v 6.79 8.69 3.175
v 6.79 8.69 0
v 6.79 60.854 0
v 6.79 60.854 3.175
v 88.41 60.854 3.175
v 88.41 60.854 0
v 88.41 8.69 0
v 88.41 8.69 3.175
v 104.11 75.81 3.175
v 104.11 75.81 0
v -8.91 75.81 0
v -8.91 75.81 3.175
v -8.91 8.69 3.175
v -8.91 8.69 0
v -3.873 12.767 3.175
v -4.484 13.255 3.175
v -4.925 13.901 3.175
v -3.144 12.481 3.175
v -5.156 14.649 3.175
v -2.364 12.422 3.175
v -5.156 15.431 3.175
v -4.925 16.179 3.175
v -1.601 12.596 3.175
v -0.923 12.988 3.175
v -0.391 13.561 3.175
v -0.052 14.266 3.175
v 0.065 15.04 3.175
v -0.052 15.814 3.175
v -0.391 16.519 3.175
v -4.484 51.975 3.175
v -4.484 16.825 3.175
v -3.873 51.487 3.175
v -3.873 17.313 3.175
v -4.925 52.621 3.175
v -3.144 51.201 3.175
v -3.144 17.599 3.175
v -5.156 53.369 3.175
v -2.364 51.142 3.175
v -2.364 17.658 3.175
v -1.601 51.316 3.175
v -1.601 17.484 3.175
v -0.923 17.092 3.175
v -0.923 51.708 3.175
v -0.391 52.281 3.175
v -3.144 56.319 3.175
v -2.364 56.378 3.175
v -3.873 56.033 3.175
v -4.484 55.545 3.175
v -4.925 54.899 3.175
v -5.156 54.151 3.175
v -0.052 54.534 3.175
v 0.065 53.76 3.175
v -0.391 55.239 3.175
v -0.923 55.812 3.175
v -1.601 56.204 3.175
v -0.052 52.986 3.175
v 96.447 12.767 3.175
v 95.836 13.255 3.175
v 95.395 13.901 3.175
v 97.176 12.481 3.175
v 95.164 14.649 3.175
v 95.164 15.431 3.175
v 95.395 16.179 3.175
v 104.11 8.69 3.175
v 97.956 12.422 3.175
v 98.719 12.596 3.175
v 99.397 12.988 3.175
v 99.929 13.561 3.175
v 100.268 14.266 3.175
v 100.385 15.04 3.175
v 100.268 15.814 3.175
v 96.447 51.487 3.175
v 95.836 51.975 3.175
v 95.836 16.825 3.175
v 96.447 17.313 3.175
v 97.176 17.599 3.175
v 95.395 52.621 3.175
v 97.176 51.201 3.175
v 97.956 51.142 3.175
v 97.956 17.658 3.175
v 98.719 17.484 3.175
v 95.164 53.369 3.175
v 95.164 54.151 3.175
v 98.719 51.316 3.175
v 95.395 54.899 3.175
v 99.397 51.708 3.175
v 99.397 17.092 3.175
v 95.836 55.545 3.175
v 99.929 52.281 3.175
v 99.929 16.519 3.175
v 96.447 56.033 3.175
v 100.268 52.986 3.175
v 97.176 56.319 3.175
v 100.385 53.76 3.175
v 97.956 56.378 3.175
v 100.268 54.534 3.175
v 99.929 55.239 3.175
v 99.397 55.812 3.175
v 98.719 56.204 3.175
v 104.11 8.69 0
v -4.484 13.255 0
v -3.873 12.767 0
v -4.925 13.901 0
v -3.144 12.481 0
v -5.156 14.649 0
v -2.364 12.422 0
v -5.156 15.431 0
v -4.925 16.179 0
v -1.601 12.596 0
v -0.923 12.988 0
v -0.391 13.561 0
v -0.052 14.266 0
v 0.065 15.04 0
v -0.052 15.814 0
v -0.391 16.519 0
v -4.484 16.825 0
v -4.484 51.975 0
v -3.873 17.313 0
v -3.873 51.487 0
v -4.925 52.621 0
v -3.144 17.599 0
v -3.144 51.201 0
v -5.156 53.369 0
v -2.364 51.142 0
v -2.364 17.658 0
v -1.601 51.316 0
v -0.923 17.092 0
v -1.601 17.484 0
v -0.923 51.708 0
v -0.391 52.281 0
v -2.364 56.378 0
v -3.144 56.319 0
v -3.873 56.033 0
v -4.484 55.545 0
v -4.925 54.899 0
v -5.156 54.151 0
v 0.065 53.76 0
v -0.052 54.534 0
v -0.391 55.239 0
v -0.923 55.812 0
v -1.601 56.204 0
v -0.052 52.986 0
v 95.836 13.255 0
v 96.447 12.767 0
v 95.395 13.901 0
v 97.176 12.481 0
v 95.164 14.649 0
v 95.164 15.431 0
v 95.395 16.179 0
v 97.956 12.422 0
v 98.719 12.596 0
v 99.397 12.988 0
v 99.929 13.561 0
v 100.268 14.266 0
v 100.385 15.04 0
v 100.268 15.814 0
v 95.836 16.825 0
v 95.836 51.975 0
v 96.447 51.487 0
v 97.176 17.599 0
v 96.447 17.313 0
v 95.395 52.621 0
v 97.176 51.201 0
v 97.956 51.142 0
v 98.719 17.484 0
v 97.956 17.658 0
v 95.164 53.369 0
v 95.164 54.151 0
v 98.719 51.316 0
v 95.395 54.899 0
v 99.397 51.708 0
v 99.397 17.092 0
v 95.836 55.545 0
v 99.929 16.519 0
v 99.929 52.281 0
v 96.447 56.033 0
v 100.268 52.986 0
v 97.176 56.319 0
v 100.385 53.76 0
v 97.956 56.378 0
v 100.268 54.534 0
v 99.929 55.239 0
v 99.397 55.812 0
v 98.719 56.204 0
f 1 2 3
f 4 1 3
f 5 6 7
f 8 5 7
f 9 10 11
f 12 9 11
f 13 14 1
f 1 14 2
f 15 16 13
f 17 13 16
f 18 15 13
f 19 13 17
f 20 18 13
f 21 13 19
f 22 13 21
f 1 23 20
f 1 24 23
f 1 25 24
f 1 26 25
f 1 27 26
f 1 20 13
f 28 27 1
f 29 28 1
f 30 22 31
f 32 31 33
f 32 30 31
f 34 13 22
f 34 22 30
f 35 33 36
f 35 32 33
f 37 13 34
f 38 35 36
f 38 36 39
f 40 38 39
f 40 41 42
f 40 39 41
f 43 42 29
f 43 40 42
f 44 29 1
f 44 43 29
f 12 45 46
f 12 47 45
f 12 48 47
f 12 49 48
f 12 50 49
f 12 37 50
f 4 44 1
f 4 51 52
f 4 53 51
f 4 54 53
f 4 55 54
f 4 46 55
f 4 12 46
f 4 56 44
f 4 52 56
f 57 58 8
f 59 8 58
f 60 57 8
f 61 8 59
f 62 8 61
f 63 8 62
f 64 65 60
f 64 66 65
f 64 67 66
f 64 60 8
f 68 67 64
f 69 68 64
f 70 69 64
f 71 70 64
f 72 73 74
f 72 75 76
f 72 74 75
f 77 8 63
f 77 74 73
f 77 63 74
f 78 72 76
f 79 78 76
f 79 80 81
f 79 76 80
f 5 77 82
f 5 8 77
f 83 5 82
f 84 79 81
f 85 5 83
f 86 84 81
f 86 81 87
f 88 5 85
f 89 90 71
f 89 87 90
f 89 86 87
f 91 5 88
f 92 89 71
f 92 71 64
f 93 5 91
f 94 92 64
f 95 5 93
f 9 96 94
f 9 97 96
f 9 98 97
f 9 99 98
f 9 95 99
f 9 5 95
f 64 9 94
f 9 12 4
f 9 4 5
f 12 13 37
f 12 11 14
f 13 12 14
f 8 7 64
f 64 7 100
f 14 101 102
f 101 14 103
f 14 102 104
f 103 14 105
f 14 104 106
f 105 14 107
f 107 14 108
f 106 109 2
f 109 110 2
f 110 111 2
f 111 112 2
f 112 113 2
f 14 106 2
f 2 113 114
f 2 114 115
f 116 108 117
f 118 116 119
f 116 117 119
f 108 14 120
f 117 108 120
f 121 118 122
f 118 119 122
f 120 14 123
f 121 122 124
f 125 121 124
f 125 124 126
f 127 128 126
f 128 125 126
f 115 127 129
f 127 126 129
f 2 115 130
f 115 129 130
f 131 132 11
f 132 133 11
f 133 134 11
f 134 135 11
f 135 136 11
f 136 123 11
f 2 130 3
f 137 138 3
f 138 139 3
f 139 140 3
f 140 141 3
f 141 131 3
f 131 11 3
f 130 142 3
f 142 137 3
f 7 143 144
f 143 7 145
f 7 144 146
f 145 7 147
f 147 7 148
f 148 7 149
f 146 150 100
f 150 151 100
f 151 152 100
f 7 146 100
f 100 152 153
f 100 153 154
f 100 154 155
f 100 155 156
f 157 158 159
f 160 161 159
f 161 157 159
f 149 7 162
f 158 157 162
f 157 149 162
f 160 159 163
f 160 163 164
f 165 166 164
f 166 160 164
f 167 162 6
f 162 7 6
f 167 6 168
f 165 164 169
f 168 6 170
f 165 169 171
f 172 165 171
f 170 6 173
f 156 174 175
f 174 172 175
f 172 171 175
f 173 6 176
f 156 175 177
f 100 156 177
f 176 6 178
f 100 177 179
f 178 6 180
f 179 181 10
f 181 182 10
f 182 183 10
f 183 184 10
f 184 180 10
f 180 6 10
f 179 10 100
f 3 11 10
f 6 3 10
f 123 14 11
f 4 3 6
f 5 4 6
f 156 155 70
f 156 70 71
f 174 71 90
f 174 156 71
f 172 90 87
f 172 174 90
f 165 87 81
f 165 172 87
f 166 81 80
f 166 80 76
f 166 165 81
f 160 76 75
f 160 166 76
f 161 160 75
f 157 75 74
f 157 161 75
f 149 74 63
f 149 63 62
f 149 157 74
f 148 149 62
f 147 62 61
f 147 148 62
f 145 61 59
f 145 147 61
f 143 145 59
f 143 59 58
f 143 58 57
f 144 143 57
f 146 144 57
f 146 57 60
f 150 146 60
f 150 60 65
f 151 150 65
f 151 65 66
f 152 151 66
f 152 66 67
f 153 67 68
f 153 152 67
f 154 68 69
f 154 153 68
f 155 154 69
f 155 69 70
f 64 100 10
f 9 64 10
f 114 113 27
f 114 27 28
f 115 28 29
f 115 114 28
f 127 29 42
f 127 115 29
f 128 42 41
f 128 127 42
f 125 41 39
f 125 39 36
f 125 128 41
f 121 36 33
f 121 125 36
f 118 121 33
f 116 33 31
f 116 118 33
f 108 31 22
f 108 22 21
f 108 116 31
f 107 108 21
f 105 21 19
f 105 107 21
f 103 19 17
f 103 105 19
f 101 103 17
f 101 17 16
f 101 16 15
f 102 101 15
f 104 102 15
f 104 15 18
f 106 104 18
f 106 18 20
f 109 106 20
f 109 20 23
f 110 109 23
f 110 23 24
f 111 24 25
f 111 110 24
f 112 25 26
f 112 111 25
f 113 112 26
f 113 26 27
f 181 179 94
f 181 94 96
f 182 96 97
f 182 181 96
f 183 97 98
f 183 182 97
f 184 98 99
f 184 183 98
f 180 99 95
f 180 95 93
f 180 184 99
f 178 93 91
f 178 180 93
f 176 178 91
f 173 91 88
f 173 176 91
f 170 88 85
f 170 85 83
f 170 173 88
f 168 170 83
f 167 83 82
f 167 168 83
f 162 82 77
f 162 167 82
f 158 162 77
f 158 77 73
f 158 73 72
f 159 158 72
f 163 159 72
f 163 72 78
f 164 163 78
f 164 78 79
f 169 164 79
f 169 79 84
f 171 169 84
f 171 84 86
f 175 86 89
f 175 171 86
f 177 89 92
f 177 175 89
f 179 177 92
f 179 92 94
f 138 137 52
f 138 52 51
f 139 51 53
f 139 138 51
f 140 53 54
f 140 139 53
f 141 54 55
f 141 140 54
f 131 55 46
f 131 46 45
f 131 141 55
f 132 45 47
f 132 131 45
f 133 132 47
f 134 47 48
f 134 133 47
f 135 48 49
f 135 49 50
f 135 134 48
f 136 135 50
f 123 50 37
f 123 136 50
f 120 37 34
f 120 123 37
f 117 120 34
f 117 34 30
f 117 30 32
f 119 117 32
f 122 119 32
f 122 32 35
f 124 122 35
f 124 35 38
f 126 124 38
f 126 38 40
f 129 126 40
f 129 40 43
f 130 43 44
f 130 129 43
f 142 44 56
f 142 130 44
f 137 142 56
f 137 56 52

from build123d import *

# Parameters (mm, degrees)
SKETCH1_R           = 2.625
BOSS_EXTRUDE1_DEPTH = 3.175


with BuildPart() as part:
    # Sketch1 → Boss-Extrude1 (new body)
    with BuildSketch(Plane.XY):
        Polygon((-8.910000095, 8.69), (6.789999905, 8.69), (6.789999905, 60.853549492), (88.409998474, 60.853549492), (88.409998474, 8.69), (104.109998474, 8.69), (104.109998474, 75.81), (88.409998474, 75.81), (6.789999905, 75.81), (-8.910000095, 75.81), align=None)
        with Locations((-2.560000095, 53.76)):
            Circle(SKETCH1_R, mode=Mode.SUBTRACT)
        with Locations((-2.560000095, 15.04)):
            Circle(SKETCH1_R, mode=Mode.SUBTRACT)
        with Locations((97.759998474, 15.04)):
            Circle(SKETCH1_R, mode=Mode.SUBTRACT)
        with Locations((97.759998474, 53.76)):
            Circle(SKETCH1_R, mode=Mode.SUBTRACT)
    extrude(amount=BOSS_EXTRUDE1_DEPTH)


solid = part.part
